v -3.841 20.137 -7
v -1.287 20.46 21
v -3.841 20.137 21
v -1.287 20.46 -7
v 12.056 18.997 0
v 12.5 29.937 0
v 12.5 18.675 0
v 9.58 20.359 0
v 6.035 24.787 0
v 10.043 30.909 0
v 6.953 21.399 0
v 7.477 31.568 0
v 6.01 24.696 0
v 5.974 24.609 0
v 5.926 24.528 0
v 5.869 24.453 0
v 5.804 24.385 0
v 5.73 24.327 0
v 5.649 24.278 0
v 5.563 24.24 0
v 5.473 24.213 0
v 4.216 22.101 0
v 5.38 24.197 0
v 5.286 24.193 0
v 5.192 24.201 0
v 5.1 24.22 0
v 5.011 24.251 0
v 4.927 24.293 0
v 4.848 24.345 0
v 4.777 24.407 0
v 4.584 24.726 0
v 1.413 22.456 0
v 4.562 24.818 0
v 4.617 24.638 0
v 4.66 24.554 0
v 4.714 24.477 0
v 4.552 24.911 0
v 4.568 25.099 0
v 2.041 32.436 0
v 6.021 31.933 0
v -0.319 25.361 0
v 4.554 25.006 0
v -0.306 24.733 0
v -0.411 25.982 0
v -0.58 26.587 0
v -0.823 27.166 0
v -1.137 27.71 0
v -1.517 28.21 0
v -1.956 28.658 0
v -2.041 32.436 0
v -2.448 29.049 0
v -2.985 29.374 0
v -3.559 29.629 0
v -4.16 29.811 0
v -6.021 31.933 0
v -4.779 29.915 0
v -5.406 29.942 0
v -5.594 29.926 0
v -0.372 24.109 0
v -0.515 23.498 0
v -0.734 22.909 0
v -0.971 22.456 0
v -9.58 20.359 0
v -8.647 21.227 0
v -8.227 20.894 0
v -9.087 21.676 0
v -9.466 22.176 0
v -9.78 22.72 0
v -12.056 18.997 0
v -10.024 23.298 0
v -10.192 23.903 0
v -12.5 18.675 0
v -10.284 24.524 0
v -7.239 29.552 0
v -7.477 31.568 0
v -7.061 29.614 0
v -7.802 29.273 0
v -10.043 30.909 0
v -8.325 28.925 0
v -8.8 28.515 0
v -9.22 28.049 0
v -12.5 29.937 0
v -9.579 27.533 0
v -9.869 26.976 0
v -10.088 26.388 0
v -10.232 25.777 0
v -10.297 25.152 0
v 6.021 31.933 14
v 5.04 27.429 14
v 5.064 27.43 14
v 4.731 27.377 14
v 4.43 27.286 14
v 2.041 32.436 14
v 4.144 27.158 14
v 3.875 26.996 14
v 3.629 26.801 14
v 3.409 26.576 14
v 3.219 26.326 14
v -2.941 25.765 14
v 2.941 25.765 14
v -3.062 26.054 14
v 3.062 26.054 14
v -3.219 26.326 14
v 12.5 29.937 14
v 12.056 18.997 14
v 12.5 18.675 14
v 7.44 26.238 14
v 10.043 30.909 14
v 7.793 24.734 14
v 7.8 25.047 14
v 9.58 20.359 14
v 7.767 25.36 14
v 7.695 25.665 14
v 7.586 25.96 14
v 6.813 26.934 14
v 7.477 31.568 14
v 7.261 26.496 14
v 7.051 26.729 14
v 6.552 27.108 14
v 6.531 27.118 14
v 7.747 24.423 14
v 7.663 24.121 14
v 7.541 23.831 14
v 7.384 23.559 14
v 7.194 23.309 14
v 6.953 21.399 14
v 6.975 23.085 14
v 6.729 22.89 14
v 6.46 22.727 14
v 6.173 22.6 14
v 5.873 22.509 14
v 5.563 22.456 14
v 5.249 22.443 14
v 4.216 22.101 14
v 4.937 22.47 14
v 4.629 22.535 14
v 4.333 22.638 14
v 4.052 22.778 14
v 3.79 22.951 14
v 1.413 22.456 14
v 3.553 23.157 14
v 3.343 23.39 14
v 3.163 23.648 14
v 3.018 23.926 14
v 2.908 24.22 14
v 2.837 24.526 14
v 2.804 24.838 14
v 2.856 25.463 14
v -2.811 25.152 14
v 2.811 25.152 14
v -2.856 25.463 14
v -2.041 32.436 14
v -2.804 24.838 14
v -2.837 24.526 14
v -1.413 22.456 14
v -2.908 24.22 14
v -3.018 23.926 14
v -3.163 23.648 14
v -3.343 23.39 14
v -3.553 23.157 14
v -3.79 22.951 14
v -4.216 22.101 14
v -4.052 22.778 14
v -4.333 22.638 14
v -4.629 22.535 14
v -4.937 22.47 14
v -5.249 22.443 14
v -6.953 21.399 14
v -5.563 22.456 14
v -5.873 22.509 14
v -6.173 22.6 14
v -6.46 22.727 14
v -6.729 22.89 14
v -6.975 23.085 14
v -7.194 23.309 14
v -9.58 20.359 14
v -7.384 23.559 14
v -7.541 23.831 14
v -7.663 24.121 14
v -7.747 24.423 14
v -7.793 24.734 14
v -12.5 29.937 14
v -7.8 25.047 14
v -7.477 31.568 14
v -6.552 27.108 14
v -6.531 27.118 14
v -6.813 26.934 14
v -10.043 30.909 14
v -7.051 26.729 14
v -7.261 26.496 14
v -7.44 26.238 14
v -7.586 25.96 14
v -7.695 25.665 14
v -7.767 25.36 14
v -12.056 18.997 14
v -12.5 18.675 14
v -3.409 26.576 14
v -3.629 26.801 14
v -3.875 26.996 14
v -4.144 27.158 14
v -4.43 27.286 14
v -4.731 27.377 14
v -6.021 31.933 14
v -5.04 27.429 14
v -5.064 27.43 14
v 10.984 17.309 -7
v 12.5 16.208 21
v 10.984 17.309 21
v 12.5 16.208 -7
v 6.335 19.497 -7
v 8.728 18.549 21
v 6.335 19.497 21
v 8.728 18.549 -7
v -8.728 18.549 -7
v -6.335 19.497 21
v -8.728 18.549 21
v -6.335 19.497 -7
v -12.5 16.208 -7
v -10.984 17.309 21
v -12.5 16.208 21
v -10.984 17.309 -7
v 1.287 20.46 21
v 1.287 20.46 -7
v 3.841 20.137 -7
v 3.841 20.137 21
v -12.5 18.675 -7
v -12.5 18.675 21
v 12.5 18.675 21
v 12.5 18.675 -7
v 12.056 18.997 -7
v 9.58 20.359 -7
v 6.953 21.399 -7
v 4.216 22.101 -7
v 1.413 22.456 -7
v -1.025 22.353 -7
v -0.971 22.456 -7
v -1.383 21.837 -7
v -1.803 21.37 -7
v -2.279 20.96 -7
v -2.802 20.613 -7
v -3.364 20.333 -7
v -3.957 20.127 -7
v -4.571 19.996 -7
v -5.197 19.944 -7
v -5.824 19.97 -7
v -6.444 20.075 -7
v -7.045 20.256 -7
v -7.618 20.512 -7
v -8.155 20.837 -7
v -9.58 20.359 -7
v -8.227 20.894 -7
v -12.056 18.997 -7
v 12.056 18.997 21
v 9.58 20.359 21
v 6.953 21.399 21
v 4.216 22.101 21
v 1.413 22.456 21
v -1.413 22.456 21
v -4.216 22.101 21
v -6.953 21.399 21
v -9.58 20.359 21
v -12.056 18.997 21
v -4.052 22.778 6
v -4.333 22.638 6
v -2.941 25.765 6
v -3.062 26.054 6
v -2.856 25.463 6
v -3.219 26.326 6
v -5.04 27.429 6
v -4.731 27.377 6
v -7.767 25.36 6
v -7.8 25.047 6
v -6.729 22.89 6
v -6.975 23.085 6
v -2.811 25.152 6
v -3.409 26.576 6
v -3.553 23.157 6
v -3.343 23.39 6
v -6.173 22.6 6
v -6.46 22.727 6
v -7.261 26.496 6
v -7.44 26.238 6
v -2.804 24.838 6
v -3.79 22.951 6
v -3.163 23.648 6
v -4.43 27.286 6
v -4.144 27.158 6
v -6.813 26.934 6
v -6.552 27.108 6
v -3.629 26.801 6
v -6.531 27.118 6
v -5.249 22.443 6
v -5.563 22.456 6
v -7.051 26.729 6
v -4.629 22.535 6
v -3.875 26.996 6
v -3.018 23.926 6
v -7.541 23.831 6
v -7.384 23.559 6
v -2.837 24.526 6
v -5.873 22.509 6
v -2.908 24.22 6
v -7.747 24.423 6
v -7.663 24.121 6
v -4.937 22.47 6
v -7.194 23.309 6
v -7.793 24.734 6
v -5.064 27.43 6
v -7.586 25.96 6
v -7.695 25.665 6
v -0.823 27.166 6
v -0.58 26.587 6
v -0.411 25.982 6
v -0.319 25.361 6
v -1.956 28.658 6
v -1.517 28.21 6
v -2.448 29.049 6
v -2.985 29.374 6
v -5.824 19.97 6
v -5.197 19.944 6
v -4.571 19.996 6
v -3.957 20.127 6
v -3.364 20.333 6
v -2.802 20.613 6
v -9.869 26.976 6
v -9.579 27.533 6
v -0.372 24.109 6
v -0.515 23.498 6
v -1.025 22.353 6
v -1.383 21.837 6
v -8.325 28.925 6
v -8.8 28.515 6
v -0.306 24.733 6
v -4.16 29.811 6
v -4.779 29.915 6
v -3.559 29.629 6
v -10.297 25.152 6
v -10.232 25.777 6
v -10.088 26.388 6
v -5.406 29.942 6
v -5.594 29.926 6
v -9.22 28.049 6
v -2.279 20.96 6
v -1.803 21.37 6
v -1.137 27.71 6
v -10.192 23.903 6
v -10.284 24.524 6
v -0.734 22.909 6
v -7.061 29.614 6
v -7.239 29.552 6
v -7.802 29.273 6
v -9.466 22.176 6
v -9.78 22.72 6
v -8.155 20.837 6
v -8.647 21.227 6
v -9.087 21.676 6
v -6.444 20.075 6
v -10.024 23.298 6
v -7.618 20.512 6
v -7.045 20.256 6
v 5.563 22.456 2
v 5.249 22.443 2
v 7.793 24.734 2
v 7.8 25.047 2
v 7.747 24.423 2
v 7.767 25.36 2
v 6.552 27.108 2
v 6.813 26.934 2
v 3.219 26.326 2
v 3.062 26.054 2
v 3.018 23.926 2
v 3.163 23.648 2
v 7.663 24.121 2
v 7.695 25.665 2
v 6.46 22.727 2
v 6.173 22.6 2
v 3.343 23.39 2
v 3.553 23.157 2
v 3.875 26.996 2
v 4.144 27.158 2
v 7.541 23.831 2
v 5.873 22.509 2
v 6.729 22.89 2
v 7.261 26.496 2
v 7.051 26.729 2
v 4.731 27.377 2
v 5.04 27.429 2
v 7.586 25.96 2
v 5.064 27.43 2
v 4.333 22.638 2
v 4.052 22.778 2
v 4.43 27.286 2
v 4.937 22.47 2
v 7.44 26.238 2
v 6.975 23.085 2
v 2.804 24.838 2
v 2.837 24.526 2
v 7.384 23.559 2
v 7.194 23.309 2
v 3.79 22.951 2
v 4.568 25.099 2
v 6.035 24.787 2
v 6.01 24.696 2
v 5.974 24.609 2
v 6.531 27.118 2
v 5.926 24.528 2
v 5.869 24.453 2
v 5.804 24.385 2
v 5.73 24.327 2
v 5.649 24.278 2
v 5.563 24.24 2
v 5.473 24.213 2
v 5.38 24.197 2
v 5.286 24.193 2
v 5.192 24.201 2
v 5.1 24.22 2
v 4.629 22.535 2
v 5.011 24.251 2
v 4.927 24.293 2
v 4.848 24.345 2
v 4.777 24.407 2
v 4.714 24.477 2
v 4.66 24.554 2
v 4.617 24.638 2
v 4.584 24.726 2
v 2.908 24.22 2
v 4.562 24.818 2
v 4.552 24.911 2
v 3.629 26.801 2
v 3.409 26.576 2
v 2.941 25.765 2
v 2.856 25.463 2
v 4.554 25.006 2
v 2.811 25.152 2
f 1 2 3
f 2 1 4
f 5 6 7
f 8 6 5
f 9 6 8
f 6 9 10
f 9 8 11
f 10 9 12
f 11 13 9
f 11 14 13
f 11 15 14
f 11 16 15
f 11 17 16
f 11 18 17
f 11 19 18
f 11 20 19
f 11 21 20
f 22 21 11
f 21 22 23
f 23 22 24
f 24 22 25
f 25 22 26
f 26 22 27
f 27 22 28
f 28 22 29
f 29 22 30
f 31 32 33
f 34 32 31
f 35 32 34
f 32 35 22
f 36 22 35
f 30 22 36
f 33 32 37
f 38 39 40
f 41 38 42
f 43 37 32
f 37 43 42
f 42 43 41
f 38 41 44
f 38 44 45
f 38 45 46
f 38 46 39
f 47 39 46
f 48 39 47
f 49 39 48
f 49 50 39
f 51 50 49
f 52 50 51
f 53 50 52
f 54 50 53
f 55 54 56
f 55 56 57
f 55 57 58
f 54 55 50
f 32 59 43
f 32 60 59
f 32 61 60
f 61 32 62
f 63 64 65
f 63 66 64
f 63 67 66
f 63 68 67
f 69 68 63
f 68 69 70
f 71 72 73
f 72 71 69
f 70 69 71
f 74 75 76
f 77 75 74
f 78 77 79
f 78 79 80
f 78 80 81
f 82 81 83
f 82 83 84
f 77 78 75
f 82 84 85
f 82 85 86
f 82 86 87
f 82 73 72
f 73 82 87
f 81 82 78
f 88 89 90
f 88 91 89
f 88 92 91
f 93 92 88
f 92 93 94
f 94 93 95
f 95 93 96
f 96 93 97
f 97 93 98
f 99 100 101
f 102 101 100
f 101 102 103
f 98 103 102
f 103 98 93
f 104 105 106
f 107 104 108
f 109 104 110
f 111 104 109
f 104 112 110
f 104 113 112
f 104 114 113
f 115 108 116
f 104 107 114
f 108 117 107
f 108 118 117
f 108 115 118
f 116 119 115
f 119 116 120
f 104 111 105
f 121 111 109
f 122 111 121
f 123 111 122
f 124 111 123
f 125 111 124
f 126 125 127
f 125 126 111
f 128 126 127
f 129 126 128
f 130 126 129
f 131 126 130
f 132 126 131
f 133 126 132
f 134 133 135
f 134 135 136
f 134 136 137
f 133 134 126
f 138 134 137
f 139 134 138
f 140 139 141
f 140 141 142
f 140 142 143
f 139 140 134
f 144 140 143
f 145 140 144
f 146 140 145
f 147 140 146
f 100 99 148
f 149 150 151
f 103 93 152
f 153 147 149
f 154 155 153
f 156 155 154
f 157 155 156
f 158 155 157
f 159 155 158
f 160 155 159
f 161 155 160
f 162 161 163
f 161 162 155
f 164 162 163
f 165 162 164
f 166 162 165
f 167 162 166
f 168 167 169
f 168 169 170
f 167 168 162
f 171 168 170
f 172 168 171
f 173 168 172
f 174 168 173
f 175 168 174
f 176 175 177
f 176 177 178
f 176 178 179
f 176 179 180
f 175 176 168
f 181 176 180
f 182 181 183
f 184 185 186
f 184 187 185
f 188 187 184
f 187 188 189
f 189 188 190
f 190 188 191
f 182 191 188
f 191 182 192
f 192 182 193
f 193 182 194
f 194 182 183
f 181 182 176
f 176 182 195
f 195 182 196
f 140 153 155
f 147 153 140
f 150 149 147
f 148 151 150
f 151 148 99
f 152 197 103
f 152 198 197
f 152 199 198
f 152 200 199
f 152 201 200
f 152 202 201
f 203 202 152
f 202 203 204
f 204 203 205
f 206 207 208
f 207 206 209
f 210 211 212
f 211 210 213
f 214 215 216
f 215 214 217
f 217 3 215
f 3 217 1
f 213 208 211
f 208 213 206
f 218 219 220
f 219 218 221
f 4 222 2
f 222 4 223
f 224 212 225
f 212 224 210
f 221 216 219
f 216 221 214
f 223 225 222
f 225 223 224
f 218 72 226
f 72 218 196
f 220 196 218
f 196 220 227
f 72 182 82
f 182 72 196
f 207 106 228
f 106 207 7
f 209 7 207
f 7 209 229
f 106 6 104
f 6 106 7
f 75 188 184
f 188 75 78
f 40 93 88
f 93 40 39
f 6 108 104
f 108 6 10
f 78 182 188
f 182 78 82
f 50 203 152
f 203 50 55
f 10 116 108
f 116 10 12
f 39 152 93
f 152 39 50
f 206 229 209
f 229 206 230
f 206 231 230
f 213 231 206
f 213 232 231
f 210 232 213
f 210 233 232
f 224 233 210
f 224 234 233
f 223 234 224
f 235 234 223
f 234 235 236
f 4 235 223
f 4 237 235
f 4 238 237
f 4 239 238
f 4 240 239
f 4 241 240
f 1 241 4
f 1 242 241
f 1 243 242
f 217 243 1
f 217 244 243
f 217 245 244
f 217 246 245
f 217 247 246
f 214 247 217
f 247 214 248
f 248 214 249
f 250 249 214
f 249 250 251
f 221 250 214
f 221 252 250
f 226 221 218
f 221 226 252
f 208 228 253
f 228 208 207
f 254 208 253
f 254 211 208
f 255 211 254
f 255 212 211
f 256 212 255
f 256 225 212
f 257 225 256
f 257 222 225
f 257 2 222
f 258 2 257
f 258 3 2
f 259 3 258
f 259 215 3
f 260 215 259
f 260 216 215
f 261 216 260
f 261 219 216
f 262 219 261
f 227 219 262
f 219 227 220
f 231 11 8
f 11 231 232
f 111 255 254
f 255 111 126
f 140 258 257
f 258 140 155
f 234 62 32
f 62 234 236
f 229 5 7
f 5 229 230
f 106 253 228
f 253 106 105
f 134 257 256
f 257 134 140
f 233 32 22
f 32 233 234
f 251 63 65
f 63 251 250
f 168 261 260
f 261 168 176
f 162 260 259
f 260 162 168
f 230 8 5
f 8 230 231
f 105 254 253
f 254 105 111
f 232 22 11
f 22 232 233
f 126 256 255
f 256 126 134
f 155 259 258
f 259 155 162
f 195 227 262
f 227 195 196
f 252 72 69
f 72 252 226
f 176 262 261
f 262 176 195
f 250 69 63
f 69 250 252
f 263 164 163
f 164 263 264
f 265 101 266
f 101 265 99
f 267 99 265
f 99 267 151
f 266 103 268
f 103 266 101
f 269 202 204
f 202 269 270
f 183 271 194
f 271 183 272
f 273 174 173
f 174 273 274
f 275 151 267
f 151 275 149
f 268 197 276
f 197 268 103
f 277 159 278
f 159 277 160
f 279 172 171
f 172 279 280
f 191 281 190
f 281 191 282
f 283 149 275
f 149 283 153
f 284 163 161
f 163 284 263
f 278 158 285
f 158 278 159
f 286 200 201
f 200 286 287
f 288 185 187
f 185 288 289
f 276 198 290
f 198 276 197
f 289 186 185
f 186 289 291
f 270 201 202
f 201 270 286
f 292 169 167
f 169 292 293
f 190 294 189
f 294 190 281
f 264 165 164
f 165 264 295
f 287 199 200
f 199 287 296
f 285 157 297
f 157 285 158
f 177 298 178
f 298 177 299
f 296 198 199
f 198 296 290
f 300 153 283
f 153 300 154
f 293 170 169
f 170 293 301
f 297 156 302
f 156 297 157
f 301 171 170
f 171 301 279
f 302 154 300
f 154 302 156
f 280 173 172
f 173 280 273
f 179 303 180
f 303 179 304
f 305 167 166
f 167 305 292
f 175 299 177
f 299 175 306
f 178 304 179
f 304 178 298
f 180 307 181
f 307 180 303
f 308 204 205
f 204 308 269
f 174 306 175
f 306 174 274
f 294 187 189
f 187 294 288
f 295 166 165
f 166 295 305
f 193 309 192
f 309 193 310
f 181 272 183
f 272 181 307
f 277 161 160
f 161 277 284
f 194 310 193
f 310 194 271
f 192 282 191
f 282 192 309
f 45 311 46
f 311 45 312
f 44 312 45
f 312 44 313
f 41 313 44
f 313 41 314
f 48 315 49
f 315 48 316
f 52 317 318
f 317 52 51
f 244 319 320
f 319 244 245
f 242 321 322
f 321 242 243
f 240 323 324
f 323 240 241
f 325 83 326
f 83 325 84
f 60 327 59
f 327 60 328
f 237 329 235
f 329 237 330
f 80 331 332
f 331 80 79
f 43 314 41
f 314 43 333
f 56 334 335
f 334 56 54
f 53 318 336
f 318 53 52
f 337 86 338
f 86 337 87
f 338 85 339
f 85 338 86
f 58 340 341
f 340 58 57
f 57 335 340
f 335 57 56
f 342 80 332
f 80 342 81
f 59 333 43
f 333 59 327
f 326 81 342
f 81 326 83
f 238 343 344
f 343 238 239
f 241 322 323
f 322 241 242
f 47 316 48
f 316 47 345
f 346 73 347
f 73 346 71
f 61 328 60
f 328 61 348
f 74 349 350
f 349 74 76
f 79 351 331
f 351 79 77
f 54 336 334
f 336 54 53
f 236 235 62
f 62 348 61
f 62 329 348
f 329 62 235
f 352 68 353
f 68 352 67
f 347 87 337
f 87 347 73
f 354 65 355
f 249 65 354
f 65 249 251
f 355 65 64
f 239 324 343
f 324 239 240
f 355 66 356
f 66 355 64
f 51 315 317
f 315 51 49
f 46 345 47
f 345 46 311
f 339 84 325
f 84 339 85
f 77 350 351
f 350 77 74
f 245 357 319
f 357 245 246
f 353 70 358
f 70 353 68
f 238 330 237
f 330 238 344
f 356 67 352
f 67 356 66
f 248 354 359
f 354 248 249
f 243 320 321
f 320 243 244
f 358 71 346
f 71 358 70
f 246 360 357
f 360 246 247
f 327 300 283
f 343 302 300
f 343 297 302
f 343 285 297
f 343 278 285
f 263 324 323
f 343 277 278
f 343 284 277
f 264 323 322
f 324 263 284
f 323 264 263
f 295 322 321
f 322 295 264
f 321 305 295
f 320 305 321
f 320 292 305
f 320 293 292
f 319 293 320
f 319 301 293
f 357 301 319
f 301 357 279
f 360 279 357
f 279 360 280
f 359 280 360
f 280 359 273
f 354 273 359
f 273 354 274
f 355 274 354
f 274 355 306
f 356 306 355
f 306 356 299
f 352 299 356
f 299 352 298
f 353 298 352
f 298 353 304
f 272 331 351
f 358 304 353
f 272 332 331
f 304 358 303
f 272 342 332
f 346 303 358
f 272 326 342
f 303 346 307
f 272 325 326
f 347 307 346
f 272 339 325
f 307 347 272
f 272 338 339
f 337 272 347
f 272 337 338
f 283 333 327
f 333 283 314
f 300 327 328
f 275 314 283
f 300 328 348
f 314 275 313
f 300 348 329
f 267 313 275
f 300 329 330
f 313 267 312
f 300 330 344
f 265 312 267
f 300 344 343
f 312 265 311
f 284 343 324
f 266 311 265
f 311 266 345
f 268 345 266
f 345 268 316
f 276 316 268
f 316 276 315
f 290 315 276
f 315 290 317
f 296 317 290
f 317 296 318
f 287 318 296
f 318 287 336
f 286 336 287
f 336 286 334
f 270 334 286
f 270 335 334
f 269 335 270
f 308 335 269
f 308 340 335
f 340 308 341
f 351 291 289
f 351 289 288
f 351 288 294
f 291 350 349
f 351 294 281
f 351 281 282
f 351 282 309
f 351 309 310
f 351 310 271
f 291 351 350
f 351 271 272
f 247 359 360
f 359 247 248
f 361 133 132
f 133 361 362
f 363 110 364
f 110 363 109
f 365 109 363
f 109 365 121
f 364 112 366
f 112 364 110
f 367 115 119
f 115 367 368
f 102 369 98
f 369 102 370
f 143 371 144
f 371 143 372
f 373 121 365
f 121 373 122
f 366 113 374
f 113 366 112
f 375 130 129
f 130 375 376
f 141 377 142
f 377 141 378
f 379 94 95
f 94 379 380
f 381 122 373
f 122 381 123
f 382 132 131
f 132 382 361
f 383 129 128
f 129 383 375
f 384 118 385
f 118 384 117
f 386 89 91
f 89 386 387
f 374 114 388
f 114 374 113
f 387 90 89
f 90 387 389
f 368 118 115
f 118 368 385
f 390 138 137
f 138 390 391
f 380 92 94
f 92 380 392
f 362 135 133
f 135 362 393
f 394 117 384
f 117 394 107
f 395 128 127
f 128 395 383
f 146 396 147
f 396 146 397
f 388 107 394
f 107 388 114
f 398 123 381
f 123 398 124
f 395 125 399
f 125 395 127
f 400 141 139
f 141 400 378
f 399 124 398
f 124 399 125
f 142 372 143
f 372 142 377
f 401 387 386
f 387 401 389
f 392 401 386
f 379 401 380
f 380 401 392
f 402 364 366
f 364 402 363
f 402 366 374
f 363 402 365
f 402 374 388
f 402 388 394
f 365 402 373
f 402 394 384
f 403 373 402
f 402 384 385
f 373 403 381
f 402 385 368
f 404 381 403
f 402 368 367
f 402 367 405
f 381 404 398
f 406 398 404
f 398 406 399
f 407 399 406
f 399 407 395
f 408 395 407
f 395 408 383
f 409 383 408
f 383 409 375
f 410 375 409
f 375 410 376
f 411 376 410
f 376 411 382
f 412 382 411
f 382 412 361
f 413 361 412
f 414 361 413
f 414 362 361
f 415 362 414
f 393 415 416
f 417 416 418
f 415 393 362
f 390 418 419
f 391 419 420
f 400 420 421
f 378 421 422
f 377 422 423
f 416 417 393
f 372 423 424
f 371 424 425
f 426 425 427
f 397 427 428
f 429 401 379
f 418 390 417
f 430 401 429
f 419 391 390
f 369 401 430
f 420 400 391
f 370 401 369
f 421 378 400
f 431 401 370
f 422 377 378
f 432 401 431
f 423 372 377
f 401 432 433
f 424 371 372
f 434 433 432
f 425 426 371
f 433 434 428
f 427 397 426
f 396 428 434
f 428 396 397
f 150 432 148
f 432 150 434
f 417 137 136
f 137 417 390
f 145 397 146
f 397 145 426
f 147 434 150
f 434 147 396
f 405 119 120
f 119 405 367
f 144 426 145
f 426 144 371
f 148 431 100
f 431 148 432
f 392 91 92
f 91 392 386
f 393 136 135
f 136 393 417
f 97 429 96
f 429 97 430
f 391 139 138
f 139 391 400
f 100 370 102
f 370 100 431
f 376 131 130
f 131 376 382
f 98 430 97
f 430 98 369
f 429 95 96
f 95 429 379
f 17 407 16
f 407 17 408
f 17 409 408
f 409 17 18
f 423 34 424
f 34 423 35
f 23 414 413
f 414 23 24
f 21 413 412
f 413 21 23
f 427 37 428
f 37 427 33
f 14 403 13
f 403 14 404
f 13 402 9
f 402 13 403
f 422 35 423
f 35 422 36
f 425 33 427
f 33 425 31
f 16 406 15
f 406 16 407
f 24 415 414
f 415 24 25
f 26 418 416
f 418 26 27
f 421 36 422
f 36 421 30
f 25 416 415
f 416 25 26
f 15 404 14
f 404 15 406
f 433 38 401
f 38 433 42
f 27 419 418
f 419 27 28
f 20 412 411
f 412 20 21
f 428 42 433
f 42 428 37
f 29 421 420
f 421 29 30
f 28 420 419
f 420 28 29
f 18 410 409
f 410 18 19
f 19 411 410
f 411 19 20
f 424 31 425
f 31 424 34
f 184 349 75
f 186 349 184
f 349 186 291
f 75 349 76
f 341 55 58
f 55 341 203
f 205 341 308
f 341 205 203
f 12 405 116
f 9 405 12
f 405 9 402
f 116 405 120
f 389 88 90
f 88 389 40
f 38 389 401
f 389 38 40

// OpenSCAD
//tube diameters
D1=41; // original


//small hole diameters
d1=5; // hose
d2=6; 
d3=10; //existing clamp
$fn=50;


module shape_1(d_inner, d_outer, z){
    
    //D2 = D1 + 2* d3 + 4; //outer tube (for topmost bound)
    //Z = 15;
    SIDE_OFFS = 8;
    
    difference() {
        //color("red")
        cylinder(d=d_outer, h=z);

        union() {
            //tube diameter
            color("blue")
            cylinder(d=d_inner, h=z);
            
            //bottom bound 
            translate([-(d_outer/2), -(d_outer/2),0])
            cube([d_outer, d_outer/2, z]);

            //left bound
            translate([-(d_inner/2)-20 + SIDE_OFFS,0,0])
                cube([20, d_outer, z]);

            //right bound
            translate([d_inner/2 - SIDE_OFFS,0,0])
                cube([20, d_outer, z]);
            
        }
    }
}

module cutout(z){
    zz = 6; //existing hole
    CUTOUT = 1.5;
    
    //left
    rotate([0,0,12])
    translate([0,(D1+d3)/2,0]) {        
        translate([0,0,2]) {
            cylinder(d=d1, h=z);                        
        }
        translate([0,0, -10])
            cylinder(d=d3, h=zz + 10);
        cylinder(d=CUTOUT, h=z);
    }
    
    rotate([0,0,12])
    translate([-CUTOUT/2,(D1+d3)/2,0]) 
    cube([CUTOUT,d3,z]);


    
    //right

    rotate([0,0,-12])
    translate([0,(D1+d3)/2,0]){
        translate([0,0,2]) {
            cylinder(d=d1, h=z);
        }
        cylinder(d=CUTOUT, h=z);
    }

    rotate([0,0,-12])
    translate([-CUTOUT/2,(D1+d3)/2,0]) 
    cube([CUTOUT,d3,z]);

}


Z = 14;

difference(){
    union()
    {
        shape_1(D1, D1 + 2* d3 + 4, Z);
        translate([0,0,-Z/2])
            shape_1(D1, D1 + 4, Z+14);
    }
    cutout(Z);
}



//color("red")
//cylinder(d=D1, h=15);
